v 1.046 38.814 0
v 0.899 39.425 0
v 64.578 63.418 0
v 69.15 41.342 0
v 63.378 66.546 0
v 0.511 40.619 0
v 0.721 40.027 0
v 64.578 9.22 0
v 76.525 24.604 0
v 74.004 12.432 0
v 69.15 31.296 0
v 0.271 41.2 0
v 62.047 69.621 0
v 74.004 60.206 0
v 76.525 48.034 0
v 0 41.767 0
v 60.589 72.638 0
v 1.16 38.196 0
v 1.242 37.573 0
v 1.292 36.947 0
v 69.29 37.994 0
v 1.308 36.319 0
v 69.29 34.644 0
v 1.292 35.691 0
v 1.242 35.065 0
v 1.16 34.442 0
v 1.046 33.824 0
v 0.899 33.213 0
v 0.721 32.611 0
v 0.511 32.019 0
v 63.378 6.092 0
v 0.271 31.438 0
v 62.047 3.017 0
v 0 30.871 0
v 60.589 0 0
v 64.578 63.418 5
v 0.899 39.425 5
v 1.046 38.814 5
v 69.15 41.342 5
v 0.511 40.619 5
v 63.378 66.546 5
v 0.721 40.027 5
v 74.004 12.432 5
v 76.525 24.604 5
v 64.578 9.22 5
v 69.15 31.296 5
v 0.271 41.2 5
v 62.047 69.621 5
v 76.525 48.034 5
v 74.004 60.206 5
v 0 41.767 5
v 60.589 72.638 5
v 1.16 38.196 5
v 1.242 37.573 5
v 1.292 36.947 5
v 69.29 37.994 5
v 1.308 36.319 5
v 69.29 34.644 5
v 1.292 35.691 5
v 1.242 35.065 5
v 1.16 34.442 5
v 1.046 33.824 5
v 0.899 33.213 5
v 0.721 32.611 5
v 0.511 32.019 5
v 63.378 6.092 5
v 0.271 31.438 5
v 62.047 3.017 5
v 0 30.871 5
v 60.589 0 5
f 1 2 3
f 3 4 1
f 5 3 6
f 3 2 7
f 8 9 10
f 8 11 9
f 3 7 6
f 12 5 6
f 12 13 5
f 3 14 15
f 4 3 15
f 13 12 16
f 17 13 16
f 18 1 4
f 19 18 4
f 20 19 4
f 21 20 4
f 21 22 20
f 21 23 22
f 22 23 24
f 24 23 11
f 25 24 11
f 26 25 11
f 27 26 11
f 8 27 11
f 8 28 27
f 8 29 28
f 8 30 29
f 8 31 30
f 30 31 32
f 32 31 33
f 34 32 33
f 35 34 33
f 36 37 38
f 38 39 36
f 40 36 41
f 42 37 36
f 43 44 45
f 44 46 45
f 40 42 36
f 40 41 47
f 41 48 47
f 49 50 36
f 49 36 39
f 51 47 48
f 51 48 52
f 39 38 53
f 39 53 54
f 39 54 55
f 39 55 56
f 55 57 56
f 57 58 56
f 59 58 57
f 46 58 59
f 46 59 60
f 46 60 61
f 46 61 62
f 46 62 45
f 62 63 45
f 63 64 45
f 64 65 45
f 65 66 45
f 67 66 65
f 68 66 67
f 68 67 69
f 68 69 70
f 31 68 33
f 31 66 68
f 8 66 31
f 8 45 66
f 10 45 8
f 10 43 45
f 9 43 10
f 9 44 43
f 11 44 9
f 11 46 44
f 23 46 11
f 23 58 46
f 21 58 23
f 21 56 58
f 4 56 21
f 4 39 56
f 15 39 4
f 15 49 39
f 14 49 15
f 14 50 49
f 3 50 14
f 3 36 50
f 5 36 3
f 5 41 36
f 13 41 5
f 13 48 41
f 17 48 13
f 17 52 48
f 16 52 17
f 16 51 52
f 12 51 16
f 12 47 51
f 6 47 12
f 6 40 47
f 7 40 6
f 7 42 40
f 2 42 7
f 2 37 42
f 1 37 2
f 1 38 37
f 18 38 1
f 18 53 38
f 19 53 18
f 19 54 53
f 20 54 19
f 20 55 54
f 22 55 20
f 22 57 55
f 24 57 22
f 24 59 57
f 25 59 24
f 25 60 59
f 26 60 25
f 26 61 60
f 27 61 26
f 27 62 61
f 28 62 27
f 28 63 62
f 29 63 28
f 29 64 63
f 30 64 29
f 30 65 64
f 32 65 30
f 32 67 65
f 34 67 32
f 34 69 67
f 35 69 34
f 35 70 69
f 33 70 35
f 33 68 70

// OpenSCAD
$fn = 32;

// ----------------------------------------------------------------------
// Gear sector: 2 teeth on 54 degrees
// ----------------------------------------------------------------------

// --- parameters (mm) ---
sector_angle = 54;        // sector angle, degrees
root_r = 80;              // root circle radius
tooth_h = 8;              // tooth height over the root circle
teeth = 2;                // number of teeth on the sector
hub_r = 12;               // hub bore radius
plate_t = 5;              // sector thickness, Z
arc_step = 3;             // sampling step of the root/hub arcs, degrees

tip_r = root_r + tooth_h;  // tip circle radius

profile = [[60.589, 0], [62.047, 3.017], [63.378, 6.092], [64.578, 9.22], [74.004, 12.432], [76.525, 24.604], [69.15, 31.296], [69.29, 34.644], [69.29, 37.994], [69.15, 41.342], [76.525, 48.034], [74.004, 60.206], [64.578, 63.418], [63.378, 66.546], [62.047, 69.621], [60.589, 72.638], [0, 41.767], [0.271, 41.2], [0.511, 40.619], [0.721, 40.027], [0.899, 39.425], [1.046, 38.814], [1.16, 38.196], [1.242, 37.573], [1.292, 36.947], [1.308, 36.319], [1.292, 35.691], [1.242, 35.065], [1.16, 34.442], [1.046, 33.824], [0.899, 33.213], [0.721, 32.611], [0.511, 32.019], [0.271, 31.438], [0, 30.871]];  // primary outline, 35 points, counter clockwise

// --- the one profile operation ---
linear_extrude(height = plate_t) polygon(points = profile);
